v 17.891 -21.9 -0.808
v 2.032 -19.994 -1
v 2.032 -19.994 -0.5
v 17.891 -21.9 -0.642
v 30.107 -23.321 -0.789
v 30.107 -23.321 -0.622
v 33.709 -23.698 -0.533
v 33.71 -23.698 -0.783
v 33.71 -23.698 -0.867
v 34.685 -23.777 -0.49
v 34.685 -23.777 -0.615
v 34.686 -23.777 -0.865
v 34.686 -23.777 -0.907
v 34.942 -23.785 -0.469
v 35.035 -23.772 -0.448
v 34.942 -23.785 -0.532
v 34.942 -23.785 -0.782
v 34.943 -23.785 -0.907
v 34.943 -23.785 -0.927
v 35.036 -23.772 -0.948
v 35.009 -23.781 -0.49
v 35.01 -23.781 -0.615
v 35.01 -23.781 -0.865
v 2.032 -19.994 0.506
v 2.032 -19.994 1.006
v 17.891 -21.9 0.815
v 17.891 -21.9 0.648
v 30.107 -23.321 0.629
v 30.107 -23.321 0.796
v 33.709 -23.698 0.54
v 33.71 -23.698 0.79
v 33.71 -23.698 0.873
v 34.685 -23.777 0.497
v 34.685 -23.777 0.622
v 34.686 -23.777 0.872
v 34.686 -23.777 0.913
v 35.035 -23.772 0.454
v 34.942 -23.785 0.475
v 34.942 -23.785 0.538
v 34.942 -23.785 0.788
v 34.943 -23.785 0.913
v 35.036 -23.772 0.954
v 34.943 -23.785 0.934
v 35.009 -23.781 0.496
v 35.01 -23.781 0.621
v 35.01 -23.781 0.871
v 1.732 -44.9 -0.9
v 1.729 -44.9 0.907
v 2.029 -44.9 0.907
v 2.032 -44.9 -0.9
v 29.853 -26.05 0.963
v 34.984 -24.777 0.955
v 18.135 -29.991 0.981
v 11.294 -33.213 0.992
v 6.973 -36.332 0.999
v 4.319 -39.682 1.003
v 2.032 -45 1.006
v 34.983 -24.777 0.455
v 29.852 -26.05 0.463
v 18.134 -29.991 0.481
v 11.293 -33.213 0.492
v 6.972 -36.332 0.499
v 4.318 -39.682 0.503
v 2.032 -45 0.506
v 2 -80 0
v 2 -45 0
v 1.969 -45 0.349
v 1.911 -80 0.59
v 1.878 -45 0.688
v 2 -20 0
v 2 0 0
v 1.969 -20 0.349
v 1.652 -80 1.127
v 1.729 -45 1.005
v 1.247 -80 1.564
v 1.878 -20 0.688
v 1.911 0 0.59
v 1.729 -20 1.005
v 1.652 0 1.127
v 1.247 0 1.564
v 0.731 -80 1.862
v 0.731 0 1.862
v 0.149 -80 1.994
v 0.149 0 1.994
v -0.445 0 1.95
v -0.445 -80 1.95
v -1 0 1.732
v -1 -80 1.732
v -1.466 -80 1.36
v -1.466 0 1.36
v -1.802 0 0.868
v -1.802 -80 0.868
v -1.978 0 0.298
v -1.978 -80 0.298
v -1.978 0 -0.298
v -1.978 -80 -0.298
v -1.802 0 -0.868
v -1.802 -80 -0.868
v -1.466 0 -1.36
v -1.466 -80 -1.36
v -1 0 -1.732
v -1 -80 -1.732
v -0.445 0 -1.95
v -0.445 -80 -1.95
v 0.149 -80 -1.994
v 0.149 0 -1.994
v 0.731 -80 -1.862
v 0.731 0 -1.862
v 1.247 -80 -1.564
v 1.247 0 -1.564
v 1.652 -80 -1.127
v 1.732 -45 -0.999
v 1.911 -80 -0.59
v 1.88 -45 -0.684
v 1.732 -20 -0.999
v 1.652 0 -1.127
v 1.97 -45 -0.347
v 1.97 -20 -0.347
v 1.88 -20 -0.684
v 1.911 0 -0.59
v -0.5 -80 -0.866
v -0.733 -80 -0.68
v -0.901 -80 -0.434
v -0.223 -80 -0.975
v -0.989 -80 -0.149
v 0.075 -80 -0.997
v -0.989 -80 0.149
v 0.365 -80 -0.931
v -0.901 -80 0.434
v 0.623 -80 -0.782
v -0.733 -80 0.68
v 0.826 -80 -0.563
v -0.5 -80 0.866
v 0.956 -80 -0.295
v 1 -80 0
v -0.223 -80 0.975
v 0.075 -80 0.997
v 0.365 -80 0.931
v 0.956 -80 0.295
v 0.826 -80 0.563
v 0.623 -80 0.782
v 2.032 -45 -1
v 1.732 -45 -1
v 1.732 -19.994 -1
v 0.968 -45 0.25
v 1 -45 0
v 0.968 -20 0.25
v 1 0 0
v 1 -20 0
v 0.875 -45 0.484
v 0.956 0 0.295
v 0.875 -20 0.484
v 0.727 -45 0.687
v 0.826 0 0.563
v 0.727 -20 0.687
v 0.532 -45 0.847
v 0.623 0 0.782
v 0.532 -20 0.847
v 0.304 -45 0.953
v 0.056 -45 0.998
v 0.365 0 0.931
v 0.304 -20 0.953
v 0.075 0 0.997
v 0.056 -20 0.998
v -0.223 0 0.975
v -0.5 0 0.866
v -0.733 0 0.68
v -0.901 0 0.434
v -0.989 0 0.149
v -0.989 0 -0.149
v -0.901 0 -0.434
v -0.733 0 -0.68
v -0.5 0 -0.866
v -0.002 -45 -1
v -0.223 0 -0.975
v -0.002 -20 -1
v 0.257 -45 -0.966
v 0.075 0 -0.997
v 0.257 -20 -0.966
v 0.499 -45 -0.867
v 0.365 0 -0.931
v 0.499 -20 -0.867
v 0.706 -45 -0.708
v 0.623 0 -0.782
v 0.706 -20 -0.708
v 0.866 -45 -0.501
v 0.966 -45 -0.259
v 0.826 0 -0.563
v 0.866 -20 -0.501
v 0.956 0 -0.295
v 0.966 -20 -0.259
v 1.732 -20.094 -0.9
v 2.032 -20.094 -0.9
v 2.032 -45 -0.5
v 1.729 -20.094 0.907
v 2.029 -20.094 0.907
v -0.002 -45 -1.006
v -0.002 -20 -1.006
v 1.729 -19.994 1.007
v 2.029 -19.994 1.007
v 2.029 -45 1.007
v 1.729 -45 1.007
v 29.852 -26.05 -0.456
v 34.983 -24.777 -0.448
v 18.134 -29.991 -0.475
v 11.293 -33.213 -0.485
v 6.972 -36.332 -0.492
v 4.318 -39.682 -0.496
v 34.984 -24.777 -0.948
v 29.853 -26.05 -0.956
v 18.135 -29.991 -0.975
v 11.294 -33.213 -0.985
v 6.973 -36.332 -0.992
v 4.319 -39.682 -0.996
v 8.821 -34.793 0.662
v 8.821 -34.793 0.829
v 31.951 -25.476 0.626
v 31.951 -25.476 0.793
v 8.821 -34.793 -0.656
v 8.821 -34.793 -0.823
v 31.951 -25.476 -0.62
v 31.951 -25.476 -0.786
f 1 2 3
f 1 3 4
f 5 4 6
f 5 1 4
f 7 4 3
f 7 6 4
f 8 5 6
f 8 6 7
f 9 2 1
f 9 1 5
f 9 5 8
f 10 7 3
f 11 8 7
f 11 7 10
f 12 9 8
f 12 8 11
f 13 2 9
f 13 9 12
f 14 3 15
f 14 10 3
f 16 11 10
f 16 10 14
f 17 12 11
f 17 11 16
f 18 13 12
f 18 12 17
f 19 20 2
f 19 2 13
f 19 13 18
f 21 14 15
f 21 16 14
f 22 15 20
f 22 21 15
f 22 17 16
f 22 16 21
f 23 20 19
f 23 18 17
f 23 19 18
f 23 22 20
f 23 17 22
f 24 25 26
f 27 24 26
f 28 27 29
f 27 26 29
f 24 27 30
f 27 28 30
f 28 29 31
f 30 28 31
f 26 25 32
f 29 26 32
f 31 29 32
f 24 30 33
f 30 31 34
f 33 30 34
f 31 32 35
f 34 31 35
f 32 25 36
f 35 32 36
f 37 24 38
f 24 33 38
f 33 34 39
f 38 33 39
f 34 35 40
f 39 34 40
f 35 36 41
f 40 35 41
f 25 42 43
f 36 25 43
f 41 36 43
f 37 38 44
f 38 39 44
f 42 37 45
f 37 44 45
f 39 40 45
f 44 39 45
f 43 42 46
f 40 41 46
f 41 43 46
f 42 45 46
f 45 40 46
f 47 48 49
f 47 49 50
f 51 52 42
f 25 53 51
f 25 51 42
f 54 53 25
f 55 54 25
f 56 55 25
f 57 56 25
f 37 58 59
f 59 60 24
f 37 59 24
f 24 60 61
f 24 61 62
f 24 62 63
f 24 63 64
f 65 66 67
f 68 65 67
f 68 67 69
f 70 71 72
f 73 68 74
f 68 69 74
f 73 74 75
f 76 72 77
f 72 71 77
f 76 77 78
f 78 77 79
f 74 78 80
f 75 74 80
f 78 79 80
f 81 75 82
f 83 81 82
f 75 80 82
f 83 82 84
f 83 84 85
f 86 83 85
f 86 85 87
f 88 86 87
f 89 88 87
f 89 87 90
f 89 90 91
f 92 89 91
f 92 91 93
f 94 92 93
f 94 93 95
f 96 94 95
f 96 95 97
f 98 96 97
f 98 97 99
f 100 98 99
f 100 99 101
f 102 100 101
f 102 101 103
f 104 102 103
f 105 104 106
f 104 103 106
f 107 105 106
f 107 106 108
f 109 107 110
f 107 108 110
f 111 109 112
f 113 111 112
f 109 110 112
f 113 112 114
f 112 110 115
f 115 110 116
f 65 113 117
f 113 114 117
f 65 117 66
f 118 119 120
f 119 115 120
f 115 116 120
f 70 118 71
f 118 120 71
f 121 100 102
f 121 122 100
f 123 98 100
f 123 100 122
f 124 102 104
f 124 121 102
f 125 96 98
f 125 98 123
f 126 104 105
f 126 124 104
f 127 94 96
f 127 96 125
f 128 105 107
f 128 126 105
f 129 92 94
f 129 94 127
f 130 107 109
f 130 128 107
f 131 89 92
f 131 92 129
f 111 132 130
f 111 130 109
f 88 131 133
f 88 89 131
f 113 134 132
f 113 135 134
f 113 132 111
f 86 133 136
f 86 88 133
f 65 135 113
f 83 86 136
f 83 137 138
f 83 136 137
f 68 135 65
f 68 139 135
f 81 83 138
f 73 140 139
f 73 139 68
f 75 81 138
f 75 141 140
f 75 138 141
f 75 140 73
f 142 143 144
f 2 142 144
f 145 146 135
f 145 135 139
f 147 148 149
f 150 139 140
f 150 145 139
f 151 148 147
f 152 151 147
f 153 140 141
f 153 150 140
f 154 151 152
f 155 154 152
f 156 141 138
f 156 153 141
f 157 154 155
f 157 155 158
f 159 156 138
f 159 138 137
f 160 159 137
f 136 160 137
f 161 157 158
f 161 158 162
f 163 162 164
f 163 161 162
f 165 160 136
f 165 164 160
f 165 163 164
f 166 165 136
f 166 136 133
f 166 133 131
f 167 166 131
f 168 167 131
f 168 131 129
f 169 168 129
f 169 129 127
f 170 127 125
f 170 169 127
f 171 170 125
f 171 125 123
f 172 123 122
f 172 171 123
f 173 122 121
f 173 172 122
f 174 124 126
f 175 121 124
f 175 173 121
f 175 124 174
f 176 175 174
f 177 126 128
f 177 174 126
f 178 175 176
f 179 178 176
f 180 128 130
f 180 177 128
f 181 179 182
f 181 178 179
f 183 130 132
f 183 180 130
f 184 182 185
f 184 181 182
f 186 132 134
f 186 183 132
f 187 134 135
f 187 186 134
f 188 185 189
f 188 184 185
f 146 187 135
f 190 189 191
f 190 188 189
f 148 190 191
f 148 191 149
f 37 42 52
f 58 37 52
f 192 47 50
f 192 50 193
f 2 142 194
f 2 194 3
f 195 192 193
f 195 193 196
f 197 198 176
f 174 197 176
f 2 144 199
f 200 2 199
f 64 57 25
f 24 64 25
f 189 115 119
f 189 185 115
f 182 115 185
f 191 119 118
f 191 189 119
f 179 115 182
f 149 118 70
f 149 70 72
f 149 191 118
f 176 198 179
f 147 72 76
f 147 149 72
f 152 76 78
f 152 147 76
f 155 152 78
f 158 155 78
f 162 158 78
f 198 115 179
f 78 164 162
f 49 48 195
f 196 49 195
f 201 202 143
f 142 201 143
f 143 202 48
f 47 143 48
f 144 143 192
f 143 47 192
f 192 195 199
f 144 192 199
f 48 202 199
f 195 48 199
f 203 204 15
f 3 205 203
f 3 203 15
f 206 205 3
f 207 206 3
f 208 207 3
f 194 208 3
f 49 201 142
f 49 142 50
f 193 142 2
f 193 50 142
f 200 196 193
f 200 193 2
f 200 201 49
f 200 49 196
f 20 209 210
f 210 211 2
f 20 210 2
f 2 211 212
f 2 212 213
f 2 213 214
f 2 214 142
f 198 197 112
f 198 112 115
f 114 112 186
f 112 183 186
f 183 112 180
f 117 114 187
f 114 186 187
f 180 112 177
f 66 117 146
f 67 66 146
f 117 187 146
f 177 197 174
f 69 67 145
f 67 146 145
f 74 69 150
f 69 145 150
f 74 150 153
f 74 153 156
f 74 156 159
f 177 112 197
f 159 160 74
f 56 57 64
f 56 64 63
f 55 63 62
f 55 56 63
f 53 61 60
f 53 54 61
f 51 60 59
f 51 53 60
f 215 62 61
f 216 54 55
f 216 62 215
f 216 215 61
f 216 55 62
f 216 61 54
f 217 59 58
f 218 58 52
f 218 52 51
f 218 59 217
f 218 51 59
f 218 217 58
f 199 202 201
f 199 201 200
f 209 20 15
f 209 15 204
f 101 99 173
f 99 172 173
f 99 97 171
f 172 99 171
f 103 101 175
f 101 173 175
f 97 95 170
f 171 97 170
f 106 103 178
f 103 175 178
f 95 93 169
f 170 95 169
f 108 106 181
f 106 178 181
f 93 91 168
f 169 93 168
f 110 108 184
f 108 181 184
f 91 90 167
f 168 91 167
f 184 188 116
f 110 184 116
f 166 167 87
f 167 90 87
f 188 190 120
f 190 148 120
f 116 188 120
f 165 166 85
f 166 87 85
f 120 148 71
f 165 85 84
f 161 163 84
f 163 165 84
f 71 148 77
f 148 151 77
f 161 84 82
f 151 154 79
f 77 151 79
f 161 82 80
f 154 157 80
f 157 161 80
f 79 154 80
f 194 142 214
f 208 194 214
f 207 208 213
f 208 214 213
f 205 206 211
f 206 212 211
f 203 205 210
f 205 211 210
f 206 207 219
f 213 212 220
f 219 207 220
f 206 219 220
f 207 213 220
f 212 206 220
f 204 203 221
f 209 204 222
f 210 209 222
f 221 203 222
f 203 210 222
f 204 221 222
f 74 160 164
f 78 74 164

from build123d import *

# Parameters (mm, degrees)
F0_R          = 2
F0_R_2        = 1
F1_DEPTH      = 80
F5_E5_W       = 2.0043330533
F5_E5_H       = 25
F6_DEPTH      = 25
F6_DEPTH_BACK = 1
F8_W          = 25.0062048435
F8_H          = 1.0036084568
F9_DEPTH      = 0.3
F10_T         = -0.1
F12_DEPTH     = 0.5


with BuildPart() as f1:
    # F0 (on Front) → F1 (new body)
    with BuildSketch(Plane.XZ):
        Circle(F0_R)
        Circle(F0_R_2, mode=Mode.SUBTRACT)
    extrude(amount=F1_DEPTH)

    # F5_E5 (on explicit) → F6 (cut, two sides)
    with BuildSketch(Plane(origin=(0.9982800111, -45, -1.0022865608), x_dir=(-0.0038684819, 0, 0.9999925174), z_dir=(-0.9999925174, 0, -0.0038684819))) as f6_sk:
        with Locations((1.0021665267, 12.5)):
            Rectangle(F5_E5_W, F5_E5_H)
    extrude(amount=-F6_DEPTH, mode=Mode.SUBTRACT)
    extrude(f6_sk.sketch, amount=F6_DEPTH_BACK, mode=Mode.SUBTRACT)


with BuildPart() as f9:
    # F8 (on face) → F9 (new body)
    with BuildSketch(Plane(origin=(1.7307944858, 0, 0.0027212049), x_dir=(0, 1, 0), z_dir=(0.9999987641, 0, 0.0015722268))):
        with Locations((-32.4973389506, -0.5013310001)):
            Rectangle(F8_W, F8_H)
        with Locations((-32.4973389506, 0.5022774567)):
            Rectangle(F8_W, F8_H)
    extrude(amount=F9_DEPTH)

    # F10
    f10_openings = [f9.faces().sort_by_distance(p)[0] for p in [
        (2.030793, -32.497339, 0.003666),
        (1.730794, -32.497339, 0.003194),
    ]]
    offset(amount=F10_T, openings=f10_openings)


with BuildPart() as f12:
    # F11 (on face) → F12 (new body)
    with BuildSketch(Plane(origin=(0.0015771561, 0, -1.0031339887), x_dir=(0.9999987641, 0, 0.0015722268), z_dir=(0.0015722268, 0, -0.9999987641))):
        with BuildLine():
            add(Edge.make_bspline(
                [(2.030796625, 45.0004413724), (3.2768731661, 41.4614047034), (6.3001384058, 32.8748964189), (31.6399499831, 25.4198492331), (34.290238067, 24.9098338007), (34.9821001291, 24.7766934335)],
                knots=[0, 0, 0, 0, 0.3412879074, 0.8280421251, 1, 1, 1, 1], degree=3))
            Line((2.030796625, 45.0004413724), (2.030796625, 19.9942365289))
            add(Edge.make_bspline(
                [(2.030796625, 19.9942365289), (18.4971969643, 21.9813155341), (34.9635973036, 23.9683945393), (35.0341200829, 23.7715635449)],
                knots=[0, 0, 0, 0, 0.9586021312, 0.9586021312, 0.9586021312, 0.9586021312], degree=3))
            Line((35.0341200829, 23.7715635449), (34.9821001291, 24.7766934335))
        make_face()
    extrude(amount=-F12_DEPTH)


with BuildPart() as f14_1:
    # F14: instance of F12
    add(f12.part.mirror(Plane.XY.offset(0.0031944326)))


solid = Compound([f1.part, f9.part, f12.part, f14_1.part])
